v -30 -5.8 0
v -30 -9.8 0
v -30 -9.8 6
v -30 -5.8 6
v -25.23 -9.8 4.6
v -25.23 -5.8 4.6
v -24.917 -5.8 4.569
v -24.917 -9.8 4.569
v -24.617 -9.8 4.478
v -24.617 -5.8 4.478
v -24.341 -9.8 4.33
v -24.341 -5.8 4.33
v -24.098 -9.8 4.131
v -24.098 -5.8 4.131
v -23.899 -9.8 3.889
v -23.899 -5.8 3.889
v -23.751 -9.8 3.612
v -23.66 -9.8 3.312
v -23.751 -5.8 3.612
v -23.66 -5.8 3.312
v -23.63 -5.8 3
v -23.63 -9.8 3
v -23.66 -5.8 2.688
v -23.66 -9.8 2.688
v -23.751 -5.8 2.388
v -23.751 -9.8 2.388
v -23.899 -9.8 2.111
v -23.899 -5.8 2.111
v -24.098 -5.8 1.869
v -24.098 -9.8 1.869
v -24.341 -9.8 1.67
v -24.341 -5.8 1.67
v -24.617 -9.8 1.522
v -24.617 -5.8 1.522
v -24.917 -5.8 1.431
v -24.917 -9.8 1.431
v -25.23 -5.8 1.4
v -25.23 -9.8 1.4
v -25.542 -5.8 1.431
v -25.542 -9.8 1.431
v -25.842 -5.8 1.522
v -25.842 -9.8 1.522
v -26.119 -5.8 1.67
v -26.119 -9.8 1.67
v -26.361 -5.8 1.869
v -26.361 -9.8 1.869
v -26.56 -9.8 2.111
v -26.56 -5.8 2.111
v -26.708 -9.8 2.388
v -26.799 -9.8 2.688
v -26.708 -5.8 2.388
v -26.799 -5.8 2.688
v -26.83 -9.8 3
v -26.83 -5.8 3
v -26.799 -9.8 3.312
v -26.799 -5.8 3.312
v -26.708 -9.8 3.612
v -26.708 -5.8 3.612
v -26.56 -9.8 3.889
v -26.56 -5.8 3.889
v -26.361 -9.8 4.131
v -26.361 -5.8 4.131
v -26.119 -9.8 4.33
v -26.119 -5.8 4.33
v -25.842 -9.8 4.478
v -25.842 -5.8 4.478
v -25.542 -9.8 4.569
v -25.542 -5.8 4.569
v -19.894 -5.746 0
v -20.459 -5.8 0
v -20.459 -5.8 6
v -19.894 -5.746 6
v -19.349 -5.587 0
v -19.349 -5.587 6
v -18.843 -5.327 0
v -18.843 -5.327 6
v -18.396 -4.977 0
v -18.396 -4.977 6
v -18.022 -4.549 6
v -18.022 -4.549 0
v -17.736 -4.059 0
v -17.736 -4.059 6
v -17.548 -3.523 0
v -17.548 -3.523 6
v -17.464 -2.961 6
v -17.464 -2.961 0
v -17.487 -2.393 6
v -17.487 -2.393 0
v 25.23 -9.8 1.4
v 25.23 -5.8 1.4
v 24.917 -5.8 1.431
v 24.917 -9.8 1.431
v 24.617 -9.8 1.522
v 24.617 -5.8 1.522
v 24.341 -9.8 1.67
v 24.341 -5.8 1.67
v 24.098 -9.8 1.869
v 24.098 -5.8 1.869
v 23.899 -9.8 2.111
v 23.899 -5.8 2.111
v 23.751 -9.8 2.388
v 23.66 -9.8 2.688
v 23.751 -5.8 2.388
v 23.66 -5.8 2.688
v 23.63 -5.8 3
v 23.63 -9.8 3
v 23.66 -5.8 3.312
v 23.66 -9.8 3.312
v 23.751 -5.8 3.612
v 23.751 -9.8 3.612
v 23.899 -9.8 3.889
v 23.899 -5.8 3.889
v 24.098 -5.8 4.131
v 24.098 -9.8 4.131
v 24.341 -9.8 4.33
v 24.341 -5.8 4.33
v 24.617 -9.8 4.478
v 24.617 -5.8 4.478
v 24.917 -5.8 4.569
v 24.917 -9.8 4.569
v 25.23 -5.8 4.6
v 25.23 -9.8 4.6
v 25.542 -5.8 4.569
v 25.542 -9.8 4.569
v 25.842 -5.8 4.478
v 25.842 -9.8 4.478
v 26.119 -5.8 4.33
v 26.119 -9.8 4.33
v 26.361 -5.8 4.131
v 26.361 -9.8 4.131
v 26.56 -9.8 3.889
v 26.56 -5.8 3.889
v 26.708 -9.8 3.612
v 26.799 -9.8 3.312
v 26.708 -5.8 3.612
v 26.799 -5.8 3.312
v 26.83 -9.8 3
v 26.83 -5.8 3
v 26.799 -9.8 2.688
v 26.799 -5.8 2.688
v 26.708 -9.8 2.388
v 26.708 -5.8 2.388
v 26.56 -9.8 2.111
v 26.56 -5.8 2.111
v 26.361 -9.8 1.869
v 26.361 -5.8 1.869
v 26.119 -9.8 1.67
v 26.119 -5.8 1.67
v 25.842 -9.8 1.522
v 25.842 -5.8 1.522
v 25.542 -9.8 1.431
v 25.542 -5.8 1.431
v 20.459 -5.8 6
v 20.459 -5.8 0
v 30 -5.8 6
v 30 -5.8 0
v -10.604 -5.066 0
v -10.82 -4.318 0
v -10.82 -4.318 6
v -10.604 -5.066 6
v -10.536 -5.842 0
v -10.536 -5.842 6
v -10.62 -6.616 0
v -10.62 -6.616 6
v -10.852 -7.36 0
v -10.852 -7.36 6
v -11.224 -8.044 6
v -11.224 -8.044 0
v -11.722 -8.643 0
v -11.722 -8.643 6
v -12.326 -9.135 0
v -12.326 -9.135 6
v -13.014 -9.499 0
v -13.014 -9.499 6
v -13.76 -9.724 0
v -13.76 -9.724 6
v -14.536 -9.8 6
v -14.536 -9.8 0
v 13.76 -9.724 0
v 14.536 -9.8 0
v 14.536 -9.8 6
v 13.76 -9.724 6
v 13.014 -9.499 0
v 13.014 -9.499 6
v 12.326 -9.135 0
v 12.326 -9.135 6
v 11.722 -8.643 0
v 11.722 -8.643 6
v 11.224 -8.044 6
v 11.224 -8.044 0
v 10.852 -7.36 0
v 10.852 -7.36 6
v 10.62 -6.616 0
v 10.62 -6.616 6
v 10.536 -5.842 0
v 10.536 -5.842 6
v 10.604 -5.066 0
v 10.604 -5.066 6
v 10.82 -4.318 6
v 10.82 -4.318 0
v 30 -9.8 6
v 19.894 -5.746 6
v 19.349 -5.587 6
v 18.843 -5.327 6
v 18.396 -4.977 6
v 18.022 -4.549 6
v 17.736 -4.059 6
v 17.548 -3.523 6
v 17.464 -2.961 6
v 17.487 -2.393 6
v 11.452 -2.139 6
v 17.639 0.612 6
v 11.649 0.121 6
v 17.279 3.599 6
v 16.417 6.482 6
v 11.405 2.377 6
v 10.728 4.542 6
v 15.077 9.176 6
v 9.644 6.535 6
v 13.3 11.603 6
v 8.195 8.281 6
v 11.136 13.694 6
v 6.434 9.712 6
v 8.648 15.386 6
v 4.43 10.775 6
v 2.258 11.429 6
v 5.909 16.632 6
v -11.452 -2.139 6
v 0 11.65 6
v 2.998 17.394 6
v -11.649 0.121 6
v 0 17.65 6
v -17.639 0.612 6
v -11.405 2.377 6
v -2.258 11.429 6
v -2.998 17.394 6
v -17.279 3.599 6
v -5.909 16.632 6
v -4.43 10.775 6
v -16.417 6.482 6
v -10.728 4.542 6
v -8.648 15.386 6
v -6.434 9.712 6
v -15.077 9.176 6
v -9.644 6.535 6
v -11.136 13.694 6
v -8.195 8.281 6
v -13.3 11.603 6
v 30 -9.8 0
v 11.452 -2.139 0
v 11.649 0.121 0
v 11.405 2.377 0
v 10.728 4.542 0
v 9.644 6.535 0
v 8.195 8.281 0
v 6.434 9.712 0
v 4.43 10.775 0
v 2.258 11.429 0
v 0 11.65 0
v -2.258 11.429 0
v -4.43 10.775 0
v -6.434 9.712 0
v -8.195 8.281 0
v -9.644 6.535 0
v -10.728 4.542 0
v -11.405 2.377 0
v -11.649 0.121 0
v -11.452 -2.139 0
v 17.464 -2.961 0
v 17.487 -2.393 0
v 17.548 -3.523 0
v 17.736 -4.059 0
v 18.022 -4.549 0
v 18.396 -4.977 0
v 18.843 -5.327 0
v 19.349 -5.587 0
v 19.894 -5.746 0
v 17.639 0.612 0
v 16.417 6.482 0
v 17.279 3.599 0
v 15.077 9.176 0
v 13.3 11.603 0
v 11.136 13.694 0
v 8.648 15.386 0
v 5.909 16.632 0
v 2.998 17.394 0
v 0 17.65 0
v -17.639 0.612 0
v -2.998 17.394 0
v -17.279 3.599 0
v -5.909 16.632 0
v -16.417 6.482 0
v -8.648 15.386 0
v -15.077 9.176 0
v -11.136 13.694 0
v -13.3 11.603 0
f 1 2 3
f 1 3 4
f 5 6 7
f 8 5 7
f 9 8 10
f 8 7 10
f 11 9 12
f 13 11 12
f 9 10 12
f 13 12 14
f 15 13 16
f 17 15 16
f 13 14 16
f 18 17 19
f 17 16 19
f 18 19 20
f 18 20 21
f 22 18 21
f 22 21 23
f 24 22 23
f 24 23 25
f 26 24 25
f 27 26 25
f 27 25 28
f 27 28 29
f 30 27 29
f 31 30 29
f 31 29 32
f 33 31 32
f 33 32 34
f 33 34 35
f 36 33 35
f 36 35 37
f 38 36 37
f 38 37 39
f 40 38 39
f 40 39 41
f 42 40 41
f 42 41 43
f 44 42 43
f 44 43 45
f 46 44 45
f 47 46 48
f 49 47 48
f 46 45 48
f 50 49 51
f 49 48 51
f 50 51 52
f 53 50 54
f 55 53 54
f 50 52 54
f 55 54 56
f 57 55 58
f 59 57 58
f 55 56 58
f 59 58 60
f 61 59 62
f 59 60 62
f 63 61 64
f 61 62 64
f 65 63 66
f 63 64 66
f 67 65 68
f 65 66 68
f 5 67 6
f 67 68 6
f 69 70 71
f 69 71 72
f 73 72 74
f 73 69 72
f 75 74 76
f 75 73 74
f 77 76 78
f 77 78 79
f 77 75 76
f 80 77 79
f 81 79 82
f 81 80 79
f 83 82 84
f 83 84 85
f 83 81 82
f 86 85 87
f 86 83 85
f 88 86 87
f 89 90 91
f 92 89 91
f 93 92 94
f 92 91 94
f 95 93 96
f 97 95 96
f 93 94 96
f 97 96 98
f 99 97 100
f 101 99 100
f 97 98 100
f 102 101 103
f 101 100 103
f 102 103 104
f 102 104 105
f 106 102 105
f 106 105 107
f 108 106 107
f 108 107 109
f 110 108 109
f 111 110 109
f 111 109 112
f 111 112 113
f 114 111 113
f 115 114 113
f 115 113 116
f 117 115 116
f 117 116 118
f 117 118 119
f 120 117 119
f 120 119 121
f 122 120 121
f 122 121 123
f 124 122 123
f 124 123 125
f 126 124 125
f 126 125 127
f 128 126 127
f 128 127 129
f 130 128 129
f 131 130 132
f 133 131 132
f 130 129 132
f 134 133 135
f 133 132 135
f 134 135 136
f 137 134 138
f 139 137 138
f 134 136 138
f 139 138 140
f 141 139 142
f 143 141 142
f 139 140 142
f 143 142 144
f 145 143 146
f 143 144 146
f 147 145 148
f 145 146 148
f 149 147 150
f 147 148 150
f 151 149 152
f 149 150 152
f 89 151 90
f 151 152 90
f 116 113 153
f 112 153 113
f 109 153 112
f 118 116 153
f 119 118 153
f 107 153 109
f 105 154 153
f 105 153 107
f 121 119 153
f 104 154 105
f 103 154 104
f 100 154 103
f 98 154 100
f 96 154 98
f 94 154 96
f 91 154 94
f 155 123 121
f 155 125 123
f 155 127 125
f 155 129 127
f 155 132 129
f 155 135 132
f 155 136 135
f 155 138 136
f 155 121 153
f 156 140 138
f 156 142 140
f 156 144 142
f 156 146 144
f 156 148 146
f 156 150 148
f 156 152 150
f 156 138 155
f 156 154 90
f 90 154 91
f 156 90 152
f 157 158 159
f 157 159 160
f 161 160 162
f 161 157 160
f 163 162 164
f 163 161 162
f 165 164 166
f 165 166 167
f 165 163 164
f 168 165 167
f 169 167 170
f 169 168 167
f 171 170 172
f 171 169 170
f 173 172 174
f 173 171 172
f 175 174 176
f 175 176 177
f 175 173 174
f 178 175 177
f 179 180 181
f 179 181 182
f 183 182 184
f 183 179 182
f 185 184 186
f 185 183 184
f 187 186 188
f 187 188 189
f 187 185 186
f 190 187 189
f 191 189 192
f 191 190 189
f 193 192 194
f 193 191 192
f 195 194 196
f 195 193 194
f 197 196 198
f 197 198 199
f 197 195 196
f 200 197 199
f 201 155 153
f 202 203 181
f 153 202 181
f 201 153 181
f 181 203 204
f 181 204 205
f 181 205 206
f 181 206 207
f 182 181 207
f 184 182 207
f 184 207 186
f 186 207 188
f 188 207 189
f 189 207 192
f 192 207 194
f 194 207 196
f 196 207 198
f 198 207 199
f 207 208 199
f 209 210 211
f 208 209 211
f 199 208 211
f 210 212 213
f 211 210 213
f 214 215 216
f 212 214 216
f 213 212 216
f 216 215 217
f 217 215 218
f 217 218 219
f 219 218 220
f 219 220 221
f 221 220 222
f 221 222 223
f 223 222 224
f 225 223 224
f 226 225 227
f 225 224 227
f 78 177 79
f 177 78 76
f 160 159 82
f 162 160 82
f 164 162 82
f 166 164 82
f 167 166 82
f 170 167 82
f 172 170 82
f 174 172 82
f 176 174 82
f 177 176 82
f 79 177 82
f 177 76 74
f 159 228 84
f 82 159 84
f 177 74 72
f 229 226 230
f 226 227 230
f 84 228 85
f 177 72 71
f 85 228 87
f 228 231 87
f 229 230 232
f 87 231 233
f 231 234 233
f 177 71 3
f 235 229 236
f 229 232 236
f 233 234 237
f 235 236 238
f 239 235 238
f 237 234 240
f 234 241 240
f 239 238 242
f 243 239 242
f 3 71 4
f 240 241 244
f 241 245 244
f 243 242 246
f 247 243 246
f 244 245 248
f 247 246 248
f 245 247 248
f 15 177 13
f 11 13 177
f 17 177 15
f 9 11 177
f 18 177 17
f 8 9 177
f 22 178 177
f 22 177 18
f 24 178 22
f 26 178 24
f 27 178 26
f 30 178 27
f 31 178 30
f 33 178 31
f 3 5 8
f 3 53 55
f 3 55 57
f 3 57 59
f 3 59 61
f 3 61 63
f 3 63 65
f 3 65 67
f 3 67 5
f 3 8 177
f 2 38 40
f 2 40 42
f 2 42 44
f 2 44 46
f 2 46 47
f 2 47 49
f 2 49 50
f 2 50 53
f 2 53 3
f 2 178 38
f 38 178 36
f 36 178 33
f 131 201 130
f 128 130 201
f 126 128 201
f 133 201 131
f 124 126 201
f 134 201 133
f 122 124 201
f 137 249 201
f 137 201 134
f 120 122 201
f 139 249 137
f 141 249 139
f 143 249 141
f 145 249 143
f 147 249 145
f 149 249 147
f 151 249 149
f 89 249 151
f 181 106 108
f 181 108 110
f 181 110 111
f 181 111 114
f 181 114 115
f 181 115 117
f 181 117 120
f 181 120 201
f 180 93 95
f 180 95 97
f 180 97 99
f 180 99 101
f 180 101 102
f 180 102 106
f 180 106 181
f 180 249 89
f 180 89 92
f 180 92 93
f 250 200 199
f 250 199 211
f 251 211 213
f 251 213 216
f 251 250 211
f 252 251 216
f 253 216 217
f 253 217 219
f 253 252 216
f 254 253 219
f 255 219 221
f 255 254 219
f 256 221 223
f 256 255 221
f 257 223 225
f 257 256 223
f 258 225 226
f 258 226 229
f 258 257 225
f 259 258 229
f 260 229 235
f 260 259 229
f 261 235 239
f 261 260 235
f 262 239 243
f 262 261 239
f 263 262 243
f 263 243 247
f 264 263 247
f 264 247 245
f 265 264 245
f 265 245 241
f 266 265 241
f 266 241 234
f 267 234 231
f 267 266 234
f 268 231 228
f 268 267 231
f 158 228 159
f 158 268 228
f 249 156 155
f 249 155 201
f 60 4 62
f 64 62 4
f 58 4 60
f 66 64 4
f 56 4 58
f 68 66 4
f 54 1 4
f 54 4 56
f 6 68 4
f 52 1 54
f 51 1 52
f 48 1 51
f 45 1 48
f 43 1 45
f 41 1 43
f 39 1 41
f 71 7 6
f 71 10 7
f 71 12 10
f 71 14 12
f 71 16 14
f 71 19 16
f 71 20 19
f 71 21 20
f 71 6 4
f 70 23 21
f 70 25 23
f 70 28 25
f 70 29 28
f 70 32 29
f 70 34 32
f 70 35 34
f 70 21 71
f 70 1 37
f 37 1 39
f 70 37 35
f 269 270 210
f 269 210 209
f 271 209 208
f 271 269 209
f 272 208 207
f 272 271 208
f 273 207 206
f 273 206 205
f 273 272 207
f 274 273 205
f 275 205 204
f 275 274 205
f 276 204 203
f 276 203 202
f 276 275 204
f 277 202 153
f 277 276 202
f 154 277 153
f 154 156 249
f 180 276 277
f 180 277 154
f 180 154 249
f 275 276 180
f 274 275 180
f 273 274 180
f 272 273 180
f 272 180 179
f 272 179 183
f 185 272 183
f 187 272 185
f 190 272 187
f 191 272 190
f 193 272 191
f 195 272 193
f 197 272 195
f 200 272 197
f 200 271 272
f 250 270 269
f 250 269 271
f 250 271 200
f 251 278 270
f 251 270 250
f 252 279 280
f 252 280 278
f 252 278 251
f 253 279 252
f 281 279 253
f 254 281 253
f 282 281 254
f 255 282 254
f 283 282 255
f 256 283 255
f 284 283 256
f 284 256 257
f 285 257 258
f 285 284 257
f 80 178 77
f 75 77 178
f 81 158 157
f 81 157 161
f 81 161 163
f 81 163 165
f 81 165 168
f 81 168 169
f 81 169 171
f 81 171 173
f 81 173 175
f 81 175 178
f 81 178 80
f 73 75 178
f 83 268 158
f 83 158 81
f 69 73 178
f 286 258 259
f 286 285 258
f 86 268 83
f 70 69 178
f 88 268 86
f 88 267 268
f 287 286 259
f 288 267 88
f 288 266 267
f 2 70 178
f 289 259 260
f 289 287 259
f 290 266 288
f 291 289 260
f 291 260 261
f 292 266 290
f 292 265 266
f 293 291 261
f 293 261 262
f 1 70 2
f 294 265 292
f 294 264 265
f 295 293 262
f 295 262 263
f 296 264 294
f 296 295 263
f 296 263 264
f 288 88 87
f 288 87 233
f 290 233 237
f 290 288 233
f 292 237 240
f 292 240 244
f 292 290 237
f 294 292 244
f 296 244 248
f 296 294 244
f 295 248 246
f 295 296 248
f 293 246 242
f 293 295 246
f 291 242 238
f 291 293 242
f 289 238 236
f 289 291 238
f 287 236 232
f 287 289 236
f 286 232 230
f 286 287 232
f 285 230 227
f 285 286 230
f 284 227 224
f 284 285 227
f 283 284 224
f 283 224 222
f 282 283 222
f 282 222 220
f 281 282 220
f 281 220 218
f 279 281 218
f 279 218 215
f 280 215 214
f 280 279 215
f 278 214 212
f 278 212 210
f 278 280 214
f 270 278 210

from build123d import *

# Parameters (mm, degrees)
BOSS_EXTRUDE1_DEPTH = 6
SKETCH2_R           = 1.6
CUT_EXTRUDE1_DEPTH  = 39.547405879


with BuildPart() as part:
    # Sketch1 → Boss-Extrude1 (new body)
    with BuildSketch(Plane.XY):
        with BuildLine():
            Line((-14.535559845, -9.8), (-30, -9.8))
            Line((-30, -9.8), (-30, -5.8))
            Line((-30, -5.8), (-20.459288844, -5.8))
            ThreePointArc((-20.459288844, -5.8), (-18.198720444, -4.772265324), (-17.486995065, -2.393220339))
            ThreePointArc((-17.486995065, -2.393220339), (0, 17.65), (17.486995065, -2.393220339))
            ThreePointArc((17.486995065, -2.393220339), (18.198720444, -4.772265324), (20.459288844, -5.8))
            Line((20.459288844, -5.8), (30, -5.8))
            Line((30, -5.8), (30, -9.8))
            Line((30, -9.8), (14.535559845, -9.8))
            ThreePointArc((14.535559845, -9.8), (11.224237416, -8.043912603), (10.820400779, -4.317571885))
            ThreePointArc((10.820400779, -4.317571885), (0, 11.65), (-10.820400779, -4.317571885))
            ThreePointArc((-10.820400779, -4.317571885), (-11.224237416, -8.043912603), (-14.535559845, -9.8))
        make_face()
    extrude(amount=BOSS_EXTRUDE1_DEPTH)

    # Sketch2 → Cut-Extrude1 (cut, through all)
    with BuildSketch(Plane(origin=(0, -5.8, 0), x_dir=(1, 0, 0), z_dir=(0, 1, 0))):
        with Locations(Location((-25.229644422, -3, 0), (0, 0, 270))):
            Circle(SKETCH2_R)
        with Locations(Location((25.229644422, -3, 0), (0, 0, 90))):
            Circle(SKETCH2_R)
    extrude(amount=-CUT_EXTRUDE1_DEPTH, mode=Mode.SUBTRACT)


solid = part.part
